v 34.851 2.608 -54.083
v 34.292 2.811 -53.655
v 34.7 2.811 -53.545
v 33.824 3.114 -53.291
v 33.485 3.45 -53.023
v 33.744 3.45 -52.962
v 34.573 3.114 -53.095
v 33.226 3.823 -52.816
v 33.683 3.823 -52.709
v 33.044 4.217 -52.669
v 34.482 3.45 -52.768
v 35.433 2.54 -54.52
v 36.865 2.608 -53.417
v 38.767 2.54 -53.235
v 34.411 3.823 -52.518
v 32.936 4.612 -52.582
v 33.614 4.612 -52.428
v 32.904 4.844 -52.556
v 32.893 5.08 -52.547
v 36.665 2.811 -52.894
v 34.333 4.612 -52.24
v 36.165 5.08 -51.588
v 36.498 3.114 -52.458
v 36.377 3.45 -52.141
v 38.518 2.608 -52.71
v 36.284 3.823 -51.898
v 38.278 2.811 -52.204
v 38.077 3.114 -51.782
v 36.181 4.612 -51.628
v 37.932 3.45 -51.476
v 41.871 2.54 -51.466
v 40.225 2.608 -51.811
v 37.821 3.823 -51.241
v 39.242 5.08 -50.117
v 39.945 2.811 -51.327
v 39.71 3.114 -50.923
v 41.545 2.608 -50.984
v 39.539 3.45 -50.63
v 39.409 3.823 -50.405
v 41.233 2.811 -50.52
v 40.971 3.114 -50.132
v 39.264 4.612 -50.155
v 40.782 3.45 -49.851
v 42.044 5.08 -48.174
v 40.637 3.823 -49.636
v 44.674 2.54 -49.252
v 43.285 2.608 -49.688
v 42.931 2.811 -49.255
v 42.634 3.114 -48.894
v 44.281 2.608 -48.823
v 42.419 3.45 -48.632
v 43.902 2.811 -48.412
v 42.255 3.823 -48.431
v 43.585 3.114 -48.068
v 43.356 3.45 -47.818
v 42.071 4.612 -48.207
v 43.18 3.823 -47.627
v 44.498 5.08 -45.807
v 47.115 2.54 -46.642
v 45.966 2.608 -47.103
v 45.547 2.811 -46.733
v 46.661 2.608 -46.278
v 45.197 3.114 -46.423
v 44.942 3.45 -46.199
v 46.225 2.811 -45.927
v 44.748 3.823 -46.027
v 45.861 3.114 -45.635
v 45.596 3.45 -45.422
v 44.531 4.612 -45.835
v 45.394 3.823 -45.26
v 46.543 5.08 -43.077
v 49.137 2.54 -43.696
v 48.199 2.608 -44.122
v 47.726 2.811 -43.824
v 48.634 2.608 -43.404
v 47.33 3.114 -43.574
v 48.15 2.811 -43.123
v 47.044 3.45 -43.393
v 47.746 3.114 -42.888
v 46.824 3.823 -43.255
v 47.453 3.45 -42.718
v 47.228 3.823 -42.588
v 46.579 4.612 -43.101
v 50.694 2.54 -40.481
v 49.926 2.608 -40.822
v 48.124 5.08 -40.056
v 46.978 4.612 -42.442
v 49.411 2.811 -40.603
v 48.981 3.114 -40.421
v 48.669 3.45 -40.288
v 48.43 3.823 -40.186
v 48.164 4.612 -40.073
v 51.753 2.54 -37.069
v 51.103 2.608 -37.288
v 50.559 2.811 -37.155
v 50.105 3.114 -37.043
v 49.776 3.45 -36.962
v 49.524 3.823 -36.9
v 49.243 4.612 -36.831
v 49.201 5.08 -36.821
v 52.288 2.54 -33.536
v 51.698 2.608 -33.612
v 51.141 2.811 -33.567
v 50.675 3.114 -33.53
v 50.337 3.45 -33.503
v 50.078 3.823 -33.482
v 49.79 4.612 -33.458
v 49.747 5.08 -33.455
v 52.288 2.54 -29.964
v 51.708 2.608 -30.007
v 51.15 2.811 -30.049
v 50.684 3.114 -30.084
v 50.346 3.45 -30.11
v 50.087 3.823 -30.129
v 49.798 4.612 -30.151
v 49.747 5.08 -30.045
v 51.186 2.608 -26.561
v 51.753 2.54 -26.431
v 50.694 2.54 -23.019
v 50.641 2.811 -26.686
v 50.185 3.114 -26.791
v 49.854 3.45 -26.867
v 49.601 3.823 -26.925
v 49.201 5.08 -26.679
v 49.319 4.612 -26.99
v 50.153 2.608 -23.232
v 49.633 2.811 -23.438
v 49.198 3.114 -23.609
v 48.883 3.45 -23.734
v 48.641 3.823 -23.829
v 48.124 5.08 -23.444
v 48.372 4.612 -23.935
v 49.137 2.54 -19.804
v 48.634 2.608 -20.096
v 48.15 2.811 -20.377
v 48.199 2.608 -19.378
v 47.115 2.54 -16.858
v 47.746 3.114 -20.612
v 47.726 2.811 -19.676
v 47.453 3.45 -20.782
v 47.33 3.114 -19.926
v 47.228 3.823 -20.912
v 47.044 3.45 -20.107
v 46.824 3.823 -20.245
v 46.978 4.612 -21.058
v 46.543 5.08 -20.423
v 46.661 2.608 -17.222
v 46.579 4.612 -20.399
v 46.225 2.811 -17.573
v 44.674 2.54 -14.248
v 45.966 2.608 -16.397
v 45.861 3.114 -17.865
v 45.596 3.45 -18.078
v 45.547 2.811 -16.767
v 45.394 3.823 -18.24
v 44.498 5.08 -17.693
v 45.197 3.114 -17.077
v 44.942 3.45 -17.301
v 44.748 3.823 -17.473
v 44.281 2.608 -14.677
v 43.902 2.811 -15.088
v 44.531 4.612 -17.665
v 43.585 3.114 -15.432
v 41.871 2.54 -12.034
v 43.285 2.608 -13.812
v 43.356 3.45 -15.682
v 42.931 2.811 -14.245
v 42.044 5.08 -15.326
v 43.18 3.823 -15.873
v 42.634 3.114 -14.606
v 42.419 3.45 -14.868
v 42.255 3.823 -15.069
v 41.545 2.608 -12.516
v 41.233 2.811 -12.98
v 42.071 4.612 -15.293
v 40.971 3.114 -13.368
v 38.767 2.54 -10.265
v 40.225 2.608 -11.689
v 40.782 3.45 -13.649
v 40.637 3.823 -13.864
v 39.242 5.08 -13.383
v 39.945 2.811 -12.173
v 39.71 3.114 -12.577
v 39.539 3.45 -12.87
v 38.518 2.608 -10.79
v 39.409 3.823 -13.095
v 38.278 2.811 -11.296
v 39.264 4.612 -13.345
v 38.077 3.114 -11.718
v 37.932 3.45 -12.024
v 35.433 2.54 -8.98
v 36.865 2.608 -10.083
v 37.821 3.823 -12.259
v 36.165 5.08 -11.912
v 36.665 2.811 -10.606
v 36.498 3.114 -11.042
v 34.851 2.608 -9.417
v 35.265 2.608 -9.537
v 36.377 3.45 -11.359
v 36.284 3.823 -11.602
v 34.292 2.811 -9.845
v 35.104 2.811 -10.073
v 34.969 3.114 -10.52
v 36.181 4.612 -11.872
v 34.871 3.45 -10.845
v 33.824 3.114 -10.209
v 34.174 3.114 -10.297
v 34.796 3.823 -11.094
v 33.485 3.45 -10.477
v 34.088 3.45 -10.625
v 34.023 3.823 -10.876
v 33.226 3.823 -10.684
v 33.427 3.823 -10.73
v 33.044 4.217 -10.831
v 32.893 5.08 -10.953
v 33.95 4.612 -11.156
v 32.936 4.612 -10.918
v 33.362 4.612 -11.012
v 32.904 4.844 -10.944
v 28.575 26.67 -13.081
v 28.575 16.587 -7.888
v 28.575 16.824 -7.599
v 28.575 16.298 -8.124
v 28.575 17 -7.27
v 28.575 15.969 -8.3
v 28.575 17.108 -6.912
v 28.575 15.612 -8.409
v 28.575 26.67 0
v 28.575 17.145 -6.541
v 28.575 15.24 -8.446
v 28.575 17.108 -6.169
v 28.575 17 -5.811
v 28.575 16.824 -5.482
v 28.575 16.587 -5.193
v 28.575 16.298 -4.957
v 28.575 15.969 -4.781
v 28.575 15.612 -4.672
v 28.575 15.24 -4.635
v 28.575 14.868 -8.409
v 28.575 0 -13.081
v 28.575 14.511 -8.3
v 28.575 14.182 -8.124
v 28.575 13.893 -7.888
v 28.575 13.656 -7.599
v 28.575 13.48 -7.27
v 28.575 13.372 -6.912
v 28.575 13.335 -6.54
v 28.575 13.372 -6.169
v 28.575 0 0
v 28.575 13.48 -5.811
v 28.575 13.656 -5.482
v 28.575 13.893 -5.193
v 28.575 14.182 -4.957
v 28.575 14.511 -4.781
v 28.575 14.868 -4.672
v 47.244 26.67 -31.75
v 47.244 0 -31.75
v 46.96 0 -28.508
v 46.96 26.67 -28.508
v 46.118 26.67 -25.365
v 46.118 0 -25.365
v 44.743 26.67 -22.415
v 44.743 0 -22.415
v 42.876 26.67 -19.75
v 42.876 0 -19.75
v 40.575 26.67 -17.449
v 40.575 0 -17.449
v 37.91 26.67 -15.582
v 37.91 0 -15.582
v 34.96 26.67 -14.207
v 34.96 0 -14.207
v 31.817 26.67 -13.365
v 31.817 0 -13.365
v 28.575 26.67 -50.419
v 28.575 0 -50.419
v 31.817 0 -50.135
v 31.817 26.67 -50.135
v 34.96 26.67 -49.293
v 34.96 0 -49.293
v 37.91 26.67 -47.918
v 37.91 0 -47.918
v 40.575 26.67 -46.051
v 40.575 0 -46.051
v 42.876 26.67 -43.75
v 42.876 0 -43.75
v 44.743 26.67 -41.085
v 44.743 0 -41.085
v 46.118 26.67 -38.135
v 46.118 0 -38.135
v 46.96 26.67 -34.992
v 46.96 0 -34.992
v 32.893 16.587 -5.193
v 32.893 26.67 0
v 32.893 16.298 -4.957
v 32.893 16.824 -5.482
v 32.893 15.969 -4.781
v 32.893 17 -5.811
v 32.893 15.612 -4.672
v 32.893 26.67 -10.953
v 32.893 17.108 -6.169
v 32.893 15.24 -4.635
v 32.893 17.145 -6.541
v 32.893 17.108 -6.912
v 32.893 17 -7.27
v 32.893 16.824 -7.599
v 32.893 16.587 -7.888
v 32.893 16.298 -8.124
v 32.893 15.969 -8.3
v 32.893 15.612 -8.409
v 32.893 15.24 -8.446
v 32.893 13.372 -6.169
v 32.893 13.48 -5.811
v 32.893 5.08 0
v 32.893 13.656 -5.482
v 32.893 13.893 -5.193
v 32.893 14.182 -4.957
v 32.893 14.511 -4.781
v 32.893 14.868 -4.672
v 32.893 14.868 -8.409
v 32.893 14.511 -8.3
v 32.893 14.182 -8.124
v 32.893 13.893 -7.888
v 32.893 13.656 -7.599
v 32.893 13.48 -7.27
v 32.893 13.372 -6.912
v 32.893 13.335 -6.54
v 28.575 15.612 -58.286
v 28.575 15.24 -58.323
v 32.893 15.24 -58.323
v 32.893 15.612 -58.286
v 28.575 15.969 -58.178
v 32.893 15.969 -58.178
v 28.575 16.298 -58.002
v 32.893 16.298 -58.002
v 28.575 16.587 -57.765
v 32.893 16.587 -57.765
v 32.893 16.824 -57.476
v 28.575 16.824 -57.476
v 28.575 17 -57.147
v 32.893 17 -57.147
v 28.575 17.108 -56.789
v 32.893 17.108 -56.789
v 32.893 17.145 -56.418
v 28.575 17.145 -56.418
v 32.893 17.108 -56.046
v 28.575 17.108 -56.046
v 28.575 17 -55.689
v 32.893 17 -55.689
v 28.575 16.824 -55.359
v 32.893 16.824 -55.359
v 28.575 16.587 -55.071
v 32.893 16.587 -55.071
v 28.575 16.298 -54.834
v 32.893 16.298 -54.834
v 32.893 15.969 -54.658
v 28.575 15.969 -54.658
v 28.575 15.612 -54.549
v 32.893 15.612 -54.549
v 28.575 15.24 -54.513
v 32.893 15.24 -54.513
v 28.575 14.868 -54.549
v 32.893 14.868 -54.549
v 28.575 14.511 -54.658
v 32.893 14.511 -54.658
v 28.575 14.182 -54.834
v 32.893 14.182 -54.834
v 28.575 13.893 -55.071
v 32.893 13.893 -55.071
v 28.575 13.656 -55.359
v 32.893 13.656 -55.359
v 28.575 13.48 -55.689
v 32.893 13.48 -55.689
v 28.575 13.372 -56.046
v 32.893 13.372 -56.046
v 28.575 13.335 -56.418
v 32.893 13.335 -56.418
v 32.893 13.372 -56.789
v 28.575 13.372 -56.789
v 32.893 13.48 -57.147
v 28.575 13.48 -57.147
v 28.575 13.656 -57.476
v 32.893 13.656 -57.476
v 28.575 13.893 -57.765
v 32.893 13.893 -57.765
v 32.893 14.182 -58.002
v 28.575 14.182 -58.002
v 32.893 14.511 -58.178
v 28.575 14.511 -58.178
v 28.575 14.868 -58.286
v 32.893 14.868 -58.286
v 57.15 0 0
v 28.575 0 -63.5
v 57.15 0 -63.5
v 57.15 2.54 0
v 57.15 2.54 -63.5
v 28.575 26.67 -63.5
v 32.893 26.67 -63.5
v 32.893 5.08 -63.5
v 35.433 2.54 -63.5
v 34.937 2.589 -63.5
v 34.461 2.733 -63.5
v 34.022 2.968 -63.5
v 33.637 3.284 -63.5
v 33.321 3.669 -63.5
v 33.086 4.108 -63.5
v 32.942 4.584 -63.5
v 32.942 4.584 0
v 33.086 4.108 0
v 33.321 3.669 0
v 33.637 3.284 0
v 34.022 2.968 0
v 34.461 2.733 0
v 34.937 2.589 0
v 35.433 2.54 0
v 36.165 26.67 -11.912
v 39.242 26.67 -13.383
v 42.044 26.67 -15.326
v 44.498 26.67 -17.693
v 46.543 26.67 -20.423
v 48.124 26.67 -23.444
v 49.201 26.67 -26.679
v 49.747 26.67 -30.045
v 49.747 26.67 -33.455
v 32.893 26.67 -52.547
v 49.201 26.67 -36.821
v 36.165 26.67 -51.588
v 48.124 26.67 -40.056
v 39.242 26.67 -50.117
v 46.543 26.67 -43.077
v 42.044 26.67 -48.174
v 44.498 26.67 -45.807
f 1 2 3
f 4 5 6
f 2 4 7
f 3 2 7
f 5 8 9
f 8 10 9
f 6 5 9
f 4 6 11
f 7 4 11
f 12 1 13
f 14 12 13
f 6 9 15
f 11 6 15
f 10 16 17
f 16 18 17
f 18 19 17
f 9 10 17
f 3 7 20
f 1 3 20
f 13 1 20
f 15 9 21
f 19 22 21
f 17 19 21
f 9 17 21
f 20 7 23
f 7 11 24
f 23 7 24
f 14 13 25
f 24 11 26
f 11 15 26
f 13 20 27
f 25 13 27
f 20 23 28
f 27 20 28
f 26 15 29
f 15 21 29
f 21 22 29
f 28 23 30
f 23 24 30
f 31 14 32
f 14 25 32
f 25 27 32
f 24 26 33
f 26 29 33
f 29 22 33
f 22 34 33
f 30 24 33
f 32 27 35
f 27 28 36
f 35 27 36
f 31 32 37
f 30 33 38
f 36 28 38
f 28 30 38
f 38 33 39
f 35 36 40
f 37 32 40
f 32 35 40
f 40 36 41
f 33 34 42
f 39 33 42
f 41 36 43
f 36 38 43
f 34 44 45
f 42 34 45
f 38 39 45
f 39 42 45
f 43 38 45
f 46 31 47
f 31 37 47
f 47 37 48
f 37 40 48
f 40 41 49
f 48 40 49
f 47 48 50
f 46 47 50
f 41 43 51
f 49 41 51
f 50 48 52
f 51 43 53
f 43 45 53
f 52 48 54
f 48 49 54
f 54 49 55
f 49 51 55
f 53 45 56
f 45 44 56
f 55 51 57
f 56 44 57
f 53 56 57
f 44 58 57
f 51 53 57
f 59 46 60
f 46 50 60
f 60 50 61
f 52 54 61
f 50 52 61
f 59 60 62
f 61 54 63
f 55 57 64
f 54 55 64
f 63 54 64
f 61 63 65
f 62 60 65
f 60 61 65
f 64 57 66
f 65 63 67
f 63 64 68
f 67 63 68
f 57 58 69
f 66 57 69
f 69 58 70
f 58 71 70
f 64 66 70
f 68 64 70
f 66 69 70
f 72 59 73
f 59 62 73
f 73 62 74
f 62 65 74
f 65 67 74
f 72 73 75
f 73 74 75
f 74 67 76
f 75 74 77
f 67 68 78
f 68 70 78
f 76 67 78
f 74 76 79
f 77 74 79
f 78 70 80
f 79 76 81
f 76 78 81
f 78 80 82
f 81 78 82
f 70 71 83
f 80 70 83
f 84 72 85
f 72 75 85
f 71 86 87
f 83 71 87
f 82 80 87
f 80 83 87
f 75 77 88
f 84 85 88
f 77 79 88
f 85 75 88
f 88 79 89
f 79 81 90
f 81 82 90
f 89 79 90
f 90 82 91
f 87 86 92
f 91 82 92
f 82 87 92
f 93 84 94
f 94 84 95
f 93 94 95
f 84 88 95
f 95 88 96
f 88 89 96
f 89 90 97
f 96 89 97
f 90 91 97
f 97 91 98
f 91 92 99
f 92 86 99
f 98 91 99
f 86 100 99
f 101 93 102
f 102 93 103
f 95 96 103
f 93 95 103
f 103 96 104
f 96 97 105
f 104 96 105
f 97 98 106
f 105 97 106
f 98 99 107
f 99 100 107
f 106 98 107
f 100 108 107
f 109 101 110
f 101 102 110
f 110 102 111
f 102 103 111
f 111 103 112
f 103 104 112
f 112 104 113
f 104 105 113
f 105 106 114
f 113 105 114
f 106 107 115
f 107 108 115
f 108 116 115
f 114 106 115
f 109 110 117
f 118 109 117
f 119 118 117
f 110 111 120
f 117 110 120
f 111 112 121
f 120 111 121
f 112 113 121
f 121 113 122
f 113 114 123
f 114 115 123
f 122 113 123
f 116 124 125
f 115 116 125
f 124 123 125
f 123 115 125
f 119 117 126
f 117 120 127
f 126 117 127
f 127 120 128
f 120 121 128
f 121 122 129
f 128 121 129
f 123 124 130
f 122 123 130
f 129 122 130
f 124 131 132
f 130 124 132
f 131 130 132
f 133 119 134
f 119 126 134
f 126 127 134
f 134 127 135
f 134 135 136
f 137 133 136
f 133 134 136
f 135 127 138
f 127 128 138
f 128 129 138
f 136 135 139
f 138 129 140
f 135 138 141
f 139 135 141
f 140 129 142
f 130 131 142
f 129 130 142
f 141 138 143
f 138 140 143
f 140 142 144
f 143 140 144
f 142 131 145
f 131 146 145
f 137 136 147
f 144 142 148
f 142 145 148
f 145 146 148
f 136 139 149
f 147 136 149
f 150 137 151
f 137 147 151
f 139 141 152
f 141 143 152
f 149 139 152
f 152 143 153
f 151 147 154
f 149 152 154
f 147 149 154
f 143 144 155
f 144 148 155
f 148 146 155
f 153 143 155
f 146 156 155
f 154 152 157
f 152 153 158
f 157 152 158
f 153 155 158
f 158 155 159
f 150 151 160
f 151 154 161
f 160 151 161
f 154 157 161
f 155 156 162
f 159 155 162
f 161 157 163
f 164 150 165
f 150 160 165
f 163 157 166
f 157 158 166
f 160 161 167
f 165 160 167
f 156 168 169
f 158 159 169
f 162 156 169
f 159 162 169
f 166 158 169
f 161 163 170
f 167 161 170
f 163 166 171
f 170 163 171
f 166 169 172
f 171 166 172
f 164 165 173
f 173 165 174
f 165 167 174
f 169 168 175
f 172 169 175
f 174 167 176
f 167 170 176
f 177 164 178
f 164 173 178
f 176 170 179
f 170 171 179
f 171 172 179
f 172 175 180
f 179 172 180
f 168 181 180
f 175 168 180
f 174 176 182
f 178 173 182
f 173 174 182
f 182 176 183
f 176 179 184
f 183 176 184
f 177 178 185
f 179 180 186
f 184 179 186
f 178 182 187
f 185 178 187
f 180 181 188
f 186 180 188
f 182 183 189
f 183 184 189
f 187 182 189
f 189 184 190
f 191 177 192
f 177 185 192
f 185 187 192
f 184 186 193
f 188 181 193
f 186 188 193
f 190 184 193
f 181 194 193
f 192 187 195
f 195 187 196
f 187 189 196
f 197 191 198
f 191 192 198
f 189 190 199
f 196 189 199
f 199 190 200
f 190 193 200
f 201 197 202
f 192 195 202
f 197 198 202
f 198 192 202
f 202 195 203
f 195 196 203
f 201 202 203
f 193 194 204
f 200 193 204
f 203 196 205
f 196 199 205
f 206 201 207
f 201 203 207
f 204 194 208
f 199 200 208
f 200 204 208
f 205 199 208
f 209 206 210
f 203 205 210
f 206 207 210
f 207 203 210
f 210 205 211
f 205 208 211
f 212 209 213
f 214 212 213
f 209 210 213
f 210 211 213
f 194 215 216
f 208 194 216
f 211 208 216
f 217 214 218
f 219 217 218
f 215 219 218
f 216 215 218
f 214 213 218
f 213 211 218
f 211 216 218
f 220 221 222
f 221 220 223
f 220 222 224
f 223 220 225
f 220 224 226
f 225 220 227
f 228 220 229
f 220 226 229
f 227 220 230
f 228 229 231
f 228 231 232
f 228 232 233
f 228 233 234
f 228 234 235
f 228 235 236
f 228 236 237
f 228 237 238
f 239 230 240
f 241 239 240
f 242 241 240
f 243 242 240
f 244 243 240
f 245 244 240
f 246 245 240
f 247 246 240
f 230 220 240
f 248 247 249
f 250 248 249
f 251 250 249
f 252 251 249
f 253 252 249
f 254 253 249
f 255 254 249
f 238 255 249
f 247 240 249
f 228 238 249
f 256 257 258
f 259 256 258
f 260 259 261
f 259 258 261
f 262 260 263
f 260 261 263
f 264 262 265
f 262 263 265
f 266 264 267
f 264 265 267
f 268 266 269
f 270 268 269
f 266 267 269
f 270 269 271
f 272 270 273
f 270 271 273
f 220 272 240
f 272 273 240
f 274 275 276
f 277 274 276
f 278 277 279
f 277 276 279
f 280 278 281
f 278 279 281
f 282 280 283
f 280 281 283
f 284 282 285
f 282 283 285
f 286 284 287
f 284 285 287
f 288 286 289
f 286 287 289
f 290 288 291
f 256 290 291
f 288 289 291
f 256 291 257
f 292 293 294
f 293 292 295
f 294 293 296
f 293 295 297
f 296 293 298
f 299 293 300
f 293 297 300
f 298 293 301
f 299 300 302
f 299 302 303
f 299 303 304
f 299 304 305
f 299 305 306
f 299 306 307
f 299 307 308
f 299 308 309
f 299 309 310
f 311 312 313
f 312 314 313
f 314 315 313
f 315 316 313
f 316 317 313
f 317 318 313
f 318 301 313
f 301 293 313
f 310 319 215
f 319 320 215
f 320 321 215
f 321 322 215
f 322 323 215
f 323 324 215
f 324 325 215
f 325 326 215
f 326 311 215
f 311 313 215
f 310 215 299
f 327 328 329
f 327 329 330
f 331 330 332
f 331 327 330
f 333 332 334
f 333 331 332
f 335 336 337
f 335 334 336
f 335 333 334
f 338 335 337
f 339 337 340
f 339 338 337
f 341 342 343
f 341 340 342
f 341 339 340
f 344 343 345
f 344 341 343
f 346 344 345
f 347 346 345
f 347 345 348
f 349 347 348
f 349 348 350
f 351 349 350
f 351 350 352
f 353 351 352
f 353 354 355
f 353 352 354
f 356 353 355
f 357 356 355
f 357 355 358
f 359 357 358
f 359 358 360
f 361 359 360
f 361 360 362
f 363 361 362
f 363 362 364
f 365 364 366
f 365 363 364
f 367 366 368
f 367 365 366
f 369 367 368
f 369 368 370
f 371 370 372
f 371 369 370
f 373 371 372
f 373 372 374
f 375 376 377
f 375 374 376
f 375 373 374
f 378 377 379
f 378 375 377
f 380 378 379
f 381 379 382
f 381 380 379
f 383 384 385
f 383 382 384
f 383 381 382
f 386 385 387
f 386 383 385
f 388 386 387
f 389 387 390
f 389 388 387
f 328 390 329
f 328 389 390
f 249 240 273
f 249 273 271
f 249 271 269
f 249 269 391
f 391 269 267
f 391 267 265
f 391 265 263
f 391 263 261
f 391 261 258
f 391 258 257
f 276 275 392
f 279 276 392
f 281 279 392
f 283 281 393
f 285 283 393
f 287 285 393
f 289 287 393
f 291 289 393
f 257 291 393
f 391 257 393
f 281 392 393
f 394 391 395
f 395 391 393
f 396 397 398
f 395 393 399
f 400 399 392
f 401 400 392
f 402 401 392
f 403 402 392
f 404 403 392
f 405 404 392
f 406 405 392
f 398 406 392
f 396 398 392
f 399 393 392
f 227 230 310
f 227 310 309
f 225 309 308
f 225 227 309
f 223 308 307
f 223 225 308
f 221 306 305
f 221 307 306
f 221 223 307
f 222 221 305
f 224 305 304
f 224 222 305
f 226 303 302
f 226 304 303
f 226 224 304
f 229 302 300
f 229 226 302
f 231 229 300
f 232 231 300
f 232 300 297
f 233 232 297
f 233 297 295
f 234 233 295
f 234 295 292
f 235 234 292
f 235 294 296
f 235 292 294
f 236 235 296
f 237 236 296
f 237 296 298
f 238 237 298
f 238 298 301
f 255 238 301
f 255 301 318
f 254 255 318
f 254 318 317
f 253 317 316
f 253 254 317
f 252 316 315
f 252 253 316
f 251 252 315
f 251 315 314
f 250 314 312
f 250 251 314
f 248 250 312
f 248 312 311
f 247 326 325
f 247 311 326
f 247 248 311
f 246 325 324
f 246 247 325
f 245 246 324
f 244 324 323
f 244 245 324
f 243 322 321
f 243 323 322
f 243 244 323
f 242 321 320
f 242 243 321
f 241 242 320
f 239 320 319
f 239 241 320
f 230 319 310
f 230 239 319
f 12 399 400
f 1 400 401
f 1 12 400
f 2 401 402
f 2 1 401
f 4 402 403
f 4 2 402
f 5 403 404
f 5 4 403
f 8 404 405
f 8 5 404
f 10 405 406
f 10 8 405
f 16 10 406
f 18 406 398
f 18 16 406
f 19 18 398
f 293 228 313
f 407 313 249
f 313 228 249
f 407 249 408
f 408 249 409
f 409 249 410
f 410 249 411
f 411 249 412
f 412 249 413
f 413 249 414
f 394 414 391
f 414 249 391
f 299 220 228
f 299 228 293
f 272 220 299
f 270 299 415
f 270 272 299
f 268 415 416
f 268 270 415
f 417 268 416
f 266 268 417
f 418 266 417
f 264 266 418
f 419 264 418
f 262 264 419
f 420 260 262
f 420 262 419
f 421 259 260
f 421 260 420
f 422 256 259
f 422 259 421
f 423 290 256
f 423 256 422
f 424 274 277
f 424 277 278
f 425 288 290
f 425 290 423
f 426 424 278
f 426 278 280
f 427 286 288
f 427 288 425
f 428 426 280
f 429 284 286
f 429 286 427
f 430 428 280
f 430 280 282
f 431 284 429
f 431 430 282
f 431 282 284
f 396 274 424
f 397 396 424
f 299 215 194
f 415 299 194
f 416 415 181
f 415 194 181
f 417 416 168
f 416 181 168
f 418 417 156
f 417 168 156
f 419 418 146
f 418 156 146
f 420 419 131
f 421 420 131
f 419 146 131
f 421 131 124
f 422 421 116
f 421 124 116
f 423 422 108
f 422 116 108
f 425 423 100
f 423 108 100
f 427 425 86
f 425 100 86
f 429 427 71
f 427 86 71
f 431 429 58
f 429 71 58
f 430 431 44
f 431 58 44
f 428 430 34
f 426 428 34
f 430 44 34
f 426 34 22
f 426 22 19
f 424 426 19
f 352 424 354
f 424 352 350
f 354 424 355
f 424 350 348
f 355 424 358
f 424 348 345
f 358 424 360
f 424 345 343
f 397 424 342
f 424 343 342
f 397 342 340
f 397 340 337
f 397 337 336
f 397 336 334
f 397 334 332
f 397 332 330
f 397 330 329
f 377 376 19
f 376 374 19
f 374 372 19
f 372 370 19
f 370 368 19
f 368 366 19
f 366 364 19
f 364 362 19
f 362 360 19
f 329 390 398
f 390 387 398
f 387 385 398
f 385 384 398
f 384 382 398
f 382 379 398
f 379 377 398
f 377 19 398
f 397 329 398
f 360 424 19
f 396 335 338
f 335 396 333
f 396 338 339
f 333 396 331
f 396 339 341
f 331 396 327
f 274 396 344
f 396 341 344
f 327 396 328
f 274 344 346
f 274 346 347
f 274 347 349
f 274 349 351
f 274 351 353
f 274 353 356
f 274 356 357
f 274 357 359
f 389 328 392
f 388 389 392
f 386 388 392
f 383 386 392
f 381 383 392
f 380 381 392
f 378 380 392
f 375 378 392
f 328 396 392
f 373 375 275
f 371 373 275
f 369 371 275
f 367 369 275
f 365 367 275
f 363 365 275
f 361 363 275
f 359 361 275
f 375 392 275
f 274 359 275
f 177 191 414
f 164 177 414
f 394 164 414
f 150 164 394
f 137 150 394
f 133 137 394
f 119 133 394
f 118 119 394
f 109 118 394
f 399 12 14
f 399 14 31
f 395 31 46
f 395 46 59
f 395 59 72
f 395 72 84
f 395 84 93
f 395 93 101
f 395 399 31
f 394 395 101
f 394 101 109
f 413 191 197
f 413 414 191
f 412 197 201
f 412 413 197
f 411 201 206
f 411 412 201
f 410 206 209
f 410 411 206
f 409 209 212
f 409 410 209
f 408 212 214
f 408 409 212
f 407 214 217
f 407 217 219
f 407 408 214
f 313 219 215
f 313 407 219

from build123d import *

# Parameters (mm, degrees)
BOSS_EXTRUDE12_DEPTH    = 26.67
BOSS_EXTRUDE13_DEPTH    = 2.54
FILLET2_R               = 2.54
SKETCH5_R               = 1.905
CUT_EXTRUDE1_DEPTH      = 58.15
CUT_EXTRUDE1_DEPTH_BACK = 1


with BuildPart() as part:
    # Sketch3 → Boss-Extrude12 (new body)
    with BuildSketch(Plane(origin=(0, 0, 0), x_dir=(1, 0, 0), z_dir=(0, 1, 0))):
        with BuildLine():
            Line((28.575, 13.081), (28.575, 0))
            Line((28.575, 0), (32.893, 0))
            Line((32.893, 0), (32.893, 10.953386454))
            ThreePointArc((32.893, 10.953386454), (49.815156756, 31.75), (32.893, 52.546613546))
            Line((32.893, 52.546613546), (32.893, 63.5))
            Line((32.893, 63.5), (28.575, 63.5))
            Line((28.575, 63.5), (28.575, 50.419))
            ThreePointArc((28.575, 50.419), (41.775976498, 44.950976498), (47.244, 31.75))
            ThreePointArc((47.244, 31.75), (41.775976498, 18.549023502), (28.575, 13.081))
        make_face()
    extrude(amount=BOSS_EXTRUDE12_DEPTH)

    # Sketch3_16 → Boss-Extrude13 (add)
    with BuildSketch(Plane(origin=(0, 0, 0), x_dir=(1, 0, 0), z_dir=(0, 1, 0))):
        with BuildLine():
            Line((32.893, 10.953386454), (32.893, 0))
            Line((32.893, 0), (57.15, 0))
            Line((57.15, 0), (57.15, 63.5))
            Line((57.15, 63.5), (32.893, 63.5))
            Line((32.893, 63.5), (32.893, 52.546613546))
            ThreePointArc((32.893, 52.546613546), (49.815156756, 31.75), (32.893, 10.953386454))
        make_face()
    extrude(amount=BOSS_EXTRUDE13_DEPTH)

    # Fillet2
    fillet2_edges = [part.edges().sort_by_distance(p)[0] for p in [
        (49.815156756, 2.54, -31.75),
        (32.893, 2.54, -5.476693227),
        (32.893, 2.54, -58.023306773),
    ]]
    fillet(fillet2_edges, radius=FILLET2_R)

    # Sketch5 → Cut-Extrude1 (cut, two sides)
    with BuildSketch(Plane(origin=(0, 0, 0), x_dir=(0, 0, -1), z_dir=(1, 0, 0))) as cut_extrude1_sk:
        with Locations((6.5405, 15.24)):
            Circle(SKETCH5_R)
        with Locations((56.41762459, 15.24)):
            Circle(SKETCH5_R)
    extrude(amount=CUT_EXTRUDE1_DEPTH, mode=Mode.SUBTRACT)
    extrude(cut_extrude1_sk.sketch, amount=-CUT_EXTRUDE1_DEPTH_BACK, mode=Mode.SUBTRACT)


solid = part.part
